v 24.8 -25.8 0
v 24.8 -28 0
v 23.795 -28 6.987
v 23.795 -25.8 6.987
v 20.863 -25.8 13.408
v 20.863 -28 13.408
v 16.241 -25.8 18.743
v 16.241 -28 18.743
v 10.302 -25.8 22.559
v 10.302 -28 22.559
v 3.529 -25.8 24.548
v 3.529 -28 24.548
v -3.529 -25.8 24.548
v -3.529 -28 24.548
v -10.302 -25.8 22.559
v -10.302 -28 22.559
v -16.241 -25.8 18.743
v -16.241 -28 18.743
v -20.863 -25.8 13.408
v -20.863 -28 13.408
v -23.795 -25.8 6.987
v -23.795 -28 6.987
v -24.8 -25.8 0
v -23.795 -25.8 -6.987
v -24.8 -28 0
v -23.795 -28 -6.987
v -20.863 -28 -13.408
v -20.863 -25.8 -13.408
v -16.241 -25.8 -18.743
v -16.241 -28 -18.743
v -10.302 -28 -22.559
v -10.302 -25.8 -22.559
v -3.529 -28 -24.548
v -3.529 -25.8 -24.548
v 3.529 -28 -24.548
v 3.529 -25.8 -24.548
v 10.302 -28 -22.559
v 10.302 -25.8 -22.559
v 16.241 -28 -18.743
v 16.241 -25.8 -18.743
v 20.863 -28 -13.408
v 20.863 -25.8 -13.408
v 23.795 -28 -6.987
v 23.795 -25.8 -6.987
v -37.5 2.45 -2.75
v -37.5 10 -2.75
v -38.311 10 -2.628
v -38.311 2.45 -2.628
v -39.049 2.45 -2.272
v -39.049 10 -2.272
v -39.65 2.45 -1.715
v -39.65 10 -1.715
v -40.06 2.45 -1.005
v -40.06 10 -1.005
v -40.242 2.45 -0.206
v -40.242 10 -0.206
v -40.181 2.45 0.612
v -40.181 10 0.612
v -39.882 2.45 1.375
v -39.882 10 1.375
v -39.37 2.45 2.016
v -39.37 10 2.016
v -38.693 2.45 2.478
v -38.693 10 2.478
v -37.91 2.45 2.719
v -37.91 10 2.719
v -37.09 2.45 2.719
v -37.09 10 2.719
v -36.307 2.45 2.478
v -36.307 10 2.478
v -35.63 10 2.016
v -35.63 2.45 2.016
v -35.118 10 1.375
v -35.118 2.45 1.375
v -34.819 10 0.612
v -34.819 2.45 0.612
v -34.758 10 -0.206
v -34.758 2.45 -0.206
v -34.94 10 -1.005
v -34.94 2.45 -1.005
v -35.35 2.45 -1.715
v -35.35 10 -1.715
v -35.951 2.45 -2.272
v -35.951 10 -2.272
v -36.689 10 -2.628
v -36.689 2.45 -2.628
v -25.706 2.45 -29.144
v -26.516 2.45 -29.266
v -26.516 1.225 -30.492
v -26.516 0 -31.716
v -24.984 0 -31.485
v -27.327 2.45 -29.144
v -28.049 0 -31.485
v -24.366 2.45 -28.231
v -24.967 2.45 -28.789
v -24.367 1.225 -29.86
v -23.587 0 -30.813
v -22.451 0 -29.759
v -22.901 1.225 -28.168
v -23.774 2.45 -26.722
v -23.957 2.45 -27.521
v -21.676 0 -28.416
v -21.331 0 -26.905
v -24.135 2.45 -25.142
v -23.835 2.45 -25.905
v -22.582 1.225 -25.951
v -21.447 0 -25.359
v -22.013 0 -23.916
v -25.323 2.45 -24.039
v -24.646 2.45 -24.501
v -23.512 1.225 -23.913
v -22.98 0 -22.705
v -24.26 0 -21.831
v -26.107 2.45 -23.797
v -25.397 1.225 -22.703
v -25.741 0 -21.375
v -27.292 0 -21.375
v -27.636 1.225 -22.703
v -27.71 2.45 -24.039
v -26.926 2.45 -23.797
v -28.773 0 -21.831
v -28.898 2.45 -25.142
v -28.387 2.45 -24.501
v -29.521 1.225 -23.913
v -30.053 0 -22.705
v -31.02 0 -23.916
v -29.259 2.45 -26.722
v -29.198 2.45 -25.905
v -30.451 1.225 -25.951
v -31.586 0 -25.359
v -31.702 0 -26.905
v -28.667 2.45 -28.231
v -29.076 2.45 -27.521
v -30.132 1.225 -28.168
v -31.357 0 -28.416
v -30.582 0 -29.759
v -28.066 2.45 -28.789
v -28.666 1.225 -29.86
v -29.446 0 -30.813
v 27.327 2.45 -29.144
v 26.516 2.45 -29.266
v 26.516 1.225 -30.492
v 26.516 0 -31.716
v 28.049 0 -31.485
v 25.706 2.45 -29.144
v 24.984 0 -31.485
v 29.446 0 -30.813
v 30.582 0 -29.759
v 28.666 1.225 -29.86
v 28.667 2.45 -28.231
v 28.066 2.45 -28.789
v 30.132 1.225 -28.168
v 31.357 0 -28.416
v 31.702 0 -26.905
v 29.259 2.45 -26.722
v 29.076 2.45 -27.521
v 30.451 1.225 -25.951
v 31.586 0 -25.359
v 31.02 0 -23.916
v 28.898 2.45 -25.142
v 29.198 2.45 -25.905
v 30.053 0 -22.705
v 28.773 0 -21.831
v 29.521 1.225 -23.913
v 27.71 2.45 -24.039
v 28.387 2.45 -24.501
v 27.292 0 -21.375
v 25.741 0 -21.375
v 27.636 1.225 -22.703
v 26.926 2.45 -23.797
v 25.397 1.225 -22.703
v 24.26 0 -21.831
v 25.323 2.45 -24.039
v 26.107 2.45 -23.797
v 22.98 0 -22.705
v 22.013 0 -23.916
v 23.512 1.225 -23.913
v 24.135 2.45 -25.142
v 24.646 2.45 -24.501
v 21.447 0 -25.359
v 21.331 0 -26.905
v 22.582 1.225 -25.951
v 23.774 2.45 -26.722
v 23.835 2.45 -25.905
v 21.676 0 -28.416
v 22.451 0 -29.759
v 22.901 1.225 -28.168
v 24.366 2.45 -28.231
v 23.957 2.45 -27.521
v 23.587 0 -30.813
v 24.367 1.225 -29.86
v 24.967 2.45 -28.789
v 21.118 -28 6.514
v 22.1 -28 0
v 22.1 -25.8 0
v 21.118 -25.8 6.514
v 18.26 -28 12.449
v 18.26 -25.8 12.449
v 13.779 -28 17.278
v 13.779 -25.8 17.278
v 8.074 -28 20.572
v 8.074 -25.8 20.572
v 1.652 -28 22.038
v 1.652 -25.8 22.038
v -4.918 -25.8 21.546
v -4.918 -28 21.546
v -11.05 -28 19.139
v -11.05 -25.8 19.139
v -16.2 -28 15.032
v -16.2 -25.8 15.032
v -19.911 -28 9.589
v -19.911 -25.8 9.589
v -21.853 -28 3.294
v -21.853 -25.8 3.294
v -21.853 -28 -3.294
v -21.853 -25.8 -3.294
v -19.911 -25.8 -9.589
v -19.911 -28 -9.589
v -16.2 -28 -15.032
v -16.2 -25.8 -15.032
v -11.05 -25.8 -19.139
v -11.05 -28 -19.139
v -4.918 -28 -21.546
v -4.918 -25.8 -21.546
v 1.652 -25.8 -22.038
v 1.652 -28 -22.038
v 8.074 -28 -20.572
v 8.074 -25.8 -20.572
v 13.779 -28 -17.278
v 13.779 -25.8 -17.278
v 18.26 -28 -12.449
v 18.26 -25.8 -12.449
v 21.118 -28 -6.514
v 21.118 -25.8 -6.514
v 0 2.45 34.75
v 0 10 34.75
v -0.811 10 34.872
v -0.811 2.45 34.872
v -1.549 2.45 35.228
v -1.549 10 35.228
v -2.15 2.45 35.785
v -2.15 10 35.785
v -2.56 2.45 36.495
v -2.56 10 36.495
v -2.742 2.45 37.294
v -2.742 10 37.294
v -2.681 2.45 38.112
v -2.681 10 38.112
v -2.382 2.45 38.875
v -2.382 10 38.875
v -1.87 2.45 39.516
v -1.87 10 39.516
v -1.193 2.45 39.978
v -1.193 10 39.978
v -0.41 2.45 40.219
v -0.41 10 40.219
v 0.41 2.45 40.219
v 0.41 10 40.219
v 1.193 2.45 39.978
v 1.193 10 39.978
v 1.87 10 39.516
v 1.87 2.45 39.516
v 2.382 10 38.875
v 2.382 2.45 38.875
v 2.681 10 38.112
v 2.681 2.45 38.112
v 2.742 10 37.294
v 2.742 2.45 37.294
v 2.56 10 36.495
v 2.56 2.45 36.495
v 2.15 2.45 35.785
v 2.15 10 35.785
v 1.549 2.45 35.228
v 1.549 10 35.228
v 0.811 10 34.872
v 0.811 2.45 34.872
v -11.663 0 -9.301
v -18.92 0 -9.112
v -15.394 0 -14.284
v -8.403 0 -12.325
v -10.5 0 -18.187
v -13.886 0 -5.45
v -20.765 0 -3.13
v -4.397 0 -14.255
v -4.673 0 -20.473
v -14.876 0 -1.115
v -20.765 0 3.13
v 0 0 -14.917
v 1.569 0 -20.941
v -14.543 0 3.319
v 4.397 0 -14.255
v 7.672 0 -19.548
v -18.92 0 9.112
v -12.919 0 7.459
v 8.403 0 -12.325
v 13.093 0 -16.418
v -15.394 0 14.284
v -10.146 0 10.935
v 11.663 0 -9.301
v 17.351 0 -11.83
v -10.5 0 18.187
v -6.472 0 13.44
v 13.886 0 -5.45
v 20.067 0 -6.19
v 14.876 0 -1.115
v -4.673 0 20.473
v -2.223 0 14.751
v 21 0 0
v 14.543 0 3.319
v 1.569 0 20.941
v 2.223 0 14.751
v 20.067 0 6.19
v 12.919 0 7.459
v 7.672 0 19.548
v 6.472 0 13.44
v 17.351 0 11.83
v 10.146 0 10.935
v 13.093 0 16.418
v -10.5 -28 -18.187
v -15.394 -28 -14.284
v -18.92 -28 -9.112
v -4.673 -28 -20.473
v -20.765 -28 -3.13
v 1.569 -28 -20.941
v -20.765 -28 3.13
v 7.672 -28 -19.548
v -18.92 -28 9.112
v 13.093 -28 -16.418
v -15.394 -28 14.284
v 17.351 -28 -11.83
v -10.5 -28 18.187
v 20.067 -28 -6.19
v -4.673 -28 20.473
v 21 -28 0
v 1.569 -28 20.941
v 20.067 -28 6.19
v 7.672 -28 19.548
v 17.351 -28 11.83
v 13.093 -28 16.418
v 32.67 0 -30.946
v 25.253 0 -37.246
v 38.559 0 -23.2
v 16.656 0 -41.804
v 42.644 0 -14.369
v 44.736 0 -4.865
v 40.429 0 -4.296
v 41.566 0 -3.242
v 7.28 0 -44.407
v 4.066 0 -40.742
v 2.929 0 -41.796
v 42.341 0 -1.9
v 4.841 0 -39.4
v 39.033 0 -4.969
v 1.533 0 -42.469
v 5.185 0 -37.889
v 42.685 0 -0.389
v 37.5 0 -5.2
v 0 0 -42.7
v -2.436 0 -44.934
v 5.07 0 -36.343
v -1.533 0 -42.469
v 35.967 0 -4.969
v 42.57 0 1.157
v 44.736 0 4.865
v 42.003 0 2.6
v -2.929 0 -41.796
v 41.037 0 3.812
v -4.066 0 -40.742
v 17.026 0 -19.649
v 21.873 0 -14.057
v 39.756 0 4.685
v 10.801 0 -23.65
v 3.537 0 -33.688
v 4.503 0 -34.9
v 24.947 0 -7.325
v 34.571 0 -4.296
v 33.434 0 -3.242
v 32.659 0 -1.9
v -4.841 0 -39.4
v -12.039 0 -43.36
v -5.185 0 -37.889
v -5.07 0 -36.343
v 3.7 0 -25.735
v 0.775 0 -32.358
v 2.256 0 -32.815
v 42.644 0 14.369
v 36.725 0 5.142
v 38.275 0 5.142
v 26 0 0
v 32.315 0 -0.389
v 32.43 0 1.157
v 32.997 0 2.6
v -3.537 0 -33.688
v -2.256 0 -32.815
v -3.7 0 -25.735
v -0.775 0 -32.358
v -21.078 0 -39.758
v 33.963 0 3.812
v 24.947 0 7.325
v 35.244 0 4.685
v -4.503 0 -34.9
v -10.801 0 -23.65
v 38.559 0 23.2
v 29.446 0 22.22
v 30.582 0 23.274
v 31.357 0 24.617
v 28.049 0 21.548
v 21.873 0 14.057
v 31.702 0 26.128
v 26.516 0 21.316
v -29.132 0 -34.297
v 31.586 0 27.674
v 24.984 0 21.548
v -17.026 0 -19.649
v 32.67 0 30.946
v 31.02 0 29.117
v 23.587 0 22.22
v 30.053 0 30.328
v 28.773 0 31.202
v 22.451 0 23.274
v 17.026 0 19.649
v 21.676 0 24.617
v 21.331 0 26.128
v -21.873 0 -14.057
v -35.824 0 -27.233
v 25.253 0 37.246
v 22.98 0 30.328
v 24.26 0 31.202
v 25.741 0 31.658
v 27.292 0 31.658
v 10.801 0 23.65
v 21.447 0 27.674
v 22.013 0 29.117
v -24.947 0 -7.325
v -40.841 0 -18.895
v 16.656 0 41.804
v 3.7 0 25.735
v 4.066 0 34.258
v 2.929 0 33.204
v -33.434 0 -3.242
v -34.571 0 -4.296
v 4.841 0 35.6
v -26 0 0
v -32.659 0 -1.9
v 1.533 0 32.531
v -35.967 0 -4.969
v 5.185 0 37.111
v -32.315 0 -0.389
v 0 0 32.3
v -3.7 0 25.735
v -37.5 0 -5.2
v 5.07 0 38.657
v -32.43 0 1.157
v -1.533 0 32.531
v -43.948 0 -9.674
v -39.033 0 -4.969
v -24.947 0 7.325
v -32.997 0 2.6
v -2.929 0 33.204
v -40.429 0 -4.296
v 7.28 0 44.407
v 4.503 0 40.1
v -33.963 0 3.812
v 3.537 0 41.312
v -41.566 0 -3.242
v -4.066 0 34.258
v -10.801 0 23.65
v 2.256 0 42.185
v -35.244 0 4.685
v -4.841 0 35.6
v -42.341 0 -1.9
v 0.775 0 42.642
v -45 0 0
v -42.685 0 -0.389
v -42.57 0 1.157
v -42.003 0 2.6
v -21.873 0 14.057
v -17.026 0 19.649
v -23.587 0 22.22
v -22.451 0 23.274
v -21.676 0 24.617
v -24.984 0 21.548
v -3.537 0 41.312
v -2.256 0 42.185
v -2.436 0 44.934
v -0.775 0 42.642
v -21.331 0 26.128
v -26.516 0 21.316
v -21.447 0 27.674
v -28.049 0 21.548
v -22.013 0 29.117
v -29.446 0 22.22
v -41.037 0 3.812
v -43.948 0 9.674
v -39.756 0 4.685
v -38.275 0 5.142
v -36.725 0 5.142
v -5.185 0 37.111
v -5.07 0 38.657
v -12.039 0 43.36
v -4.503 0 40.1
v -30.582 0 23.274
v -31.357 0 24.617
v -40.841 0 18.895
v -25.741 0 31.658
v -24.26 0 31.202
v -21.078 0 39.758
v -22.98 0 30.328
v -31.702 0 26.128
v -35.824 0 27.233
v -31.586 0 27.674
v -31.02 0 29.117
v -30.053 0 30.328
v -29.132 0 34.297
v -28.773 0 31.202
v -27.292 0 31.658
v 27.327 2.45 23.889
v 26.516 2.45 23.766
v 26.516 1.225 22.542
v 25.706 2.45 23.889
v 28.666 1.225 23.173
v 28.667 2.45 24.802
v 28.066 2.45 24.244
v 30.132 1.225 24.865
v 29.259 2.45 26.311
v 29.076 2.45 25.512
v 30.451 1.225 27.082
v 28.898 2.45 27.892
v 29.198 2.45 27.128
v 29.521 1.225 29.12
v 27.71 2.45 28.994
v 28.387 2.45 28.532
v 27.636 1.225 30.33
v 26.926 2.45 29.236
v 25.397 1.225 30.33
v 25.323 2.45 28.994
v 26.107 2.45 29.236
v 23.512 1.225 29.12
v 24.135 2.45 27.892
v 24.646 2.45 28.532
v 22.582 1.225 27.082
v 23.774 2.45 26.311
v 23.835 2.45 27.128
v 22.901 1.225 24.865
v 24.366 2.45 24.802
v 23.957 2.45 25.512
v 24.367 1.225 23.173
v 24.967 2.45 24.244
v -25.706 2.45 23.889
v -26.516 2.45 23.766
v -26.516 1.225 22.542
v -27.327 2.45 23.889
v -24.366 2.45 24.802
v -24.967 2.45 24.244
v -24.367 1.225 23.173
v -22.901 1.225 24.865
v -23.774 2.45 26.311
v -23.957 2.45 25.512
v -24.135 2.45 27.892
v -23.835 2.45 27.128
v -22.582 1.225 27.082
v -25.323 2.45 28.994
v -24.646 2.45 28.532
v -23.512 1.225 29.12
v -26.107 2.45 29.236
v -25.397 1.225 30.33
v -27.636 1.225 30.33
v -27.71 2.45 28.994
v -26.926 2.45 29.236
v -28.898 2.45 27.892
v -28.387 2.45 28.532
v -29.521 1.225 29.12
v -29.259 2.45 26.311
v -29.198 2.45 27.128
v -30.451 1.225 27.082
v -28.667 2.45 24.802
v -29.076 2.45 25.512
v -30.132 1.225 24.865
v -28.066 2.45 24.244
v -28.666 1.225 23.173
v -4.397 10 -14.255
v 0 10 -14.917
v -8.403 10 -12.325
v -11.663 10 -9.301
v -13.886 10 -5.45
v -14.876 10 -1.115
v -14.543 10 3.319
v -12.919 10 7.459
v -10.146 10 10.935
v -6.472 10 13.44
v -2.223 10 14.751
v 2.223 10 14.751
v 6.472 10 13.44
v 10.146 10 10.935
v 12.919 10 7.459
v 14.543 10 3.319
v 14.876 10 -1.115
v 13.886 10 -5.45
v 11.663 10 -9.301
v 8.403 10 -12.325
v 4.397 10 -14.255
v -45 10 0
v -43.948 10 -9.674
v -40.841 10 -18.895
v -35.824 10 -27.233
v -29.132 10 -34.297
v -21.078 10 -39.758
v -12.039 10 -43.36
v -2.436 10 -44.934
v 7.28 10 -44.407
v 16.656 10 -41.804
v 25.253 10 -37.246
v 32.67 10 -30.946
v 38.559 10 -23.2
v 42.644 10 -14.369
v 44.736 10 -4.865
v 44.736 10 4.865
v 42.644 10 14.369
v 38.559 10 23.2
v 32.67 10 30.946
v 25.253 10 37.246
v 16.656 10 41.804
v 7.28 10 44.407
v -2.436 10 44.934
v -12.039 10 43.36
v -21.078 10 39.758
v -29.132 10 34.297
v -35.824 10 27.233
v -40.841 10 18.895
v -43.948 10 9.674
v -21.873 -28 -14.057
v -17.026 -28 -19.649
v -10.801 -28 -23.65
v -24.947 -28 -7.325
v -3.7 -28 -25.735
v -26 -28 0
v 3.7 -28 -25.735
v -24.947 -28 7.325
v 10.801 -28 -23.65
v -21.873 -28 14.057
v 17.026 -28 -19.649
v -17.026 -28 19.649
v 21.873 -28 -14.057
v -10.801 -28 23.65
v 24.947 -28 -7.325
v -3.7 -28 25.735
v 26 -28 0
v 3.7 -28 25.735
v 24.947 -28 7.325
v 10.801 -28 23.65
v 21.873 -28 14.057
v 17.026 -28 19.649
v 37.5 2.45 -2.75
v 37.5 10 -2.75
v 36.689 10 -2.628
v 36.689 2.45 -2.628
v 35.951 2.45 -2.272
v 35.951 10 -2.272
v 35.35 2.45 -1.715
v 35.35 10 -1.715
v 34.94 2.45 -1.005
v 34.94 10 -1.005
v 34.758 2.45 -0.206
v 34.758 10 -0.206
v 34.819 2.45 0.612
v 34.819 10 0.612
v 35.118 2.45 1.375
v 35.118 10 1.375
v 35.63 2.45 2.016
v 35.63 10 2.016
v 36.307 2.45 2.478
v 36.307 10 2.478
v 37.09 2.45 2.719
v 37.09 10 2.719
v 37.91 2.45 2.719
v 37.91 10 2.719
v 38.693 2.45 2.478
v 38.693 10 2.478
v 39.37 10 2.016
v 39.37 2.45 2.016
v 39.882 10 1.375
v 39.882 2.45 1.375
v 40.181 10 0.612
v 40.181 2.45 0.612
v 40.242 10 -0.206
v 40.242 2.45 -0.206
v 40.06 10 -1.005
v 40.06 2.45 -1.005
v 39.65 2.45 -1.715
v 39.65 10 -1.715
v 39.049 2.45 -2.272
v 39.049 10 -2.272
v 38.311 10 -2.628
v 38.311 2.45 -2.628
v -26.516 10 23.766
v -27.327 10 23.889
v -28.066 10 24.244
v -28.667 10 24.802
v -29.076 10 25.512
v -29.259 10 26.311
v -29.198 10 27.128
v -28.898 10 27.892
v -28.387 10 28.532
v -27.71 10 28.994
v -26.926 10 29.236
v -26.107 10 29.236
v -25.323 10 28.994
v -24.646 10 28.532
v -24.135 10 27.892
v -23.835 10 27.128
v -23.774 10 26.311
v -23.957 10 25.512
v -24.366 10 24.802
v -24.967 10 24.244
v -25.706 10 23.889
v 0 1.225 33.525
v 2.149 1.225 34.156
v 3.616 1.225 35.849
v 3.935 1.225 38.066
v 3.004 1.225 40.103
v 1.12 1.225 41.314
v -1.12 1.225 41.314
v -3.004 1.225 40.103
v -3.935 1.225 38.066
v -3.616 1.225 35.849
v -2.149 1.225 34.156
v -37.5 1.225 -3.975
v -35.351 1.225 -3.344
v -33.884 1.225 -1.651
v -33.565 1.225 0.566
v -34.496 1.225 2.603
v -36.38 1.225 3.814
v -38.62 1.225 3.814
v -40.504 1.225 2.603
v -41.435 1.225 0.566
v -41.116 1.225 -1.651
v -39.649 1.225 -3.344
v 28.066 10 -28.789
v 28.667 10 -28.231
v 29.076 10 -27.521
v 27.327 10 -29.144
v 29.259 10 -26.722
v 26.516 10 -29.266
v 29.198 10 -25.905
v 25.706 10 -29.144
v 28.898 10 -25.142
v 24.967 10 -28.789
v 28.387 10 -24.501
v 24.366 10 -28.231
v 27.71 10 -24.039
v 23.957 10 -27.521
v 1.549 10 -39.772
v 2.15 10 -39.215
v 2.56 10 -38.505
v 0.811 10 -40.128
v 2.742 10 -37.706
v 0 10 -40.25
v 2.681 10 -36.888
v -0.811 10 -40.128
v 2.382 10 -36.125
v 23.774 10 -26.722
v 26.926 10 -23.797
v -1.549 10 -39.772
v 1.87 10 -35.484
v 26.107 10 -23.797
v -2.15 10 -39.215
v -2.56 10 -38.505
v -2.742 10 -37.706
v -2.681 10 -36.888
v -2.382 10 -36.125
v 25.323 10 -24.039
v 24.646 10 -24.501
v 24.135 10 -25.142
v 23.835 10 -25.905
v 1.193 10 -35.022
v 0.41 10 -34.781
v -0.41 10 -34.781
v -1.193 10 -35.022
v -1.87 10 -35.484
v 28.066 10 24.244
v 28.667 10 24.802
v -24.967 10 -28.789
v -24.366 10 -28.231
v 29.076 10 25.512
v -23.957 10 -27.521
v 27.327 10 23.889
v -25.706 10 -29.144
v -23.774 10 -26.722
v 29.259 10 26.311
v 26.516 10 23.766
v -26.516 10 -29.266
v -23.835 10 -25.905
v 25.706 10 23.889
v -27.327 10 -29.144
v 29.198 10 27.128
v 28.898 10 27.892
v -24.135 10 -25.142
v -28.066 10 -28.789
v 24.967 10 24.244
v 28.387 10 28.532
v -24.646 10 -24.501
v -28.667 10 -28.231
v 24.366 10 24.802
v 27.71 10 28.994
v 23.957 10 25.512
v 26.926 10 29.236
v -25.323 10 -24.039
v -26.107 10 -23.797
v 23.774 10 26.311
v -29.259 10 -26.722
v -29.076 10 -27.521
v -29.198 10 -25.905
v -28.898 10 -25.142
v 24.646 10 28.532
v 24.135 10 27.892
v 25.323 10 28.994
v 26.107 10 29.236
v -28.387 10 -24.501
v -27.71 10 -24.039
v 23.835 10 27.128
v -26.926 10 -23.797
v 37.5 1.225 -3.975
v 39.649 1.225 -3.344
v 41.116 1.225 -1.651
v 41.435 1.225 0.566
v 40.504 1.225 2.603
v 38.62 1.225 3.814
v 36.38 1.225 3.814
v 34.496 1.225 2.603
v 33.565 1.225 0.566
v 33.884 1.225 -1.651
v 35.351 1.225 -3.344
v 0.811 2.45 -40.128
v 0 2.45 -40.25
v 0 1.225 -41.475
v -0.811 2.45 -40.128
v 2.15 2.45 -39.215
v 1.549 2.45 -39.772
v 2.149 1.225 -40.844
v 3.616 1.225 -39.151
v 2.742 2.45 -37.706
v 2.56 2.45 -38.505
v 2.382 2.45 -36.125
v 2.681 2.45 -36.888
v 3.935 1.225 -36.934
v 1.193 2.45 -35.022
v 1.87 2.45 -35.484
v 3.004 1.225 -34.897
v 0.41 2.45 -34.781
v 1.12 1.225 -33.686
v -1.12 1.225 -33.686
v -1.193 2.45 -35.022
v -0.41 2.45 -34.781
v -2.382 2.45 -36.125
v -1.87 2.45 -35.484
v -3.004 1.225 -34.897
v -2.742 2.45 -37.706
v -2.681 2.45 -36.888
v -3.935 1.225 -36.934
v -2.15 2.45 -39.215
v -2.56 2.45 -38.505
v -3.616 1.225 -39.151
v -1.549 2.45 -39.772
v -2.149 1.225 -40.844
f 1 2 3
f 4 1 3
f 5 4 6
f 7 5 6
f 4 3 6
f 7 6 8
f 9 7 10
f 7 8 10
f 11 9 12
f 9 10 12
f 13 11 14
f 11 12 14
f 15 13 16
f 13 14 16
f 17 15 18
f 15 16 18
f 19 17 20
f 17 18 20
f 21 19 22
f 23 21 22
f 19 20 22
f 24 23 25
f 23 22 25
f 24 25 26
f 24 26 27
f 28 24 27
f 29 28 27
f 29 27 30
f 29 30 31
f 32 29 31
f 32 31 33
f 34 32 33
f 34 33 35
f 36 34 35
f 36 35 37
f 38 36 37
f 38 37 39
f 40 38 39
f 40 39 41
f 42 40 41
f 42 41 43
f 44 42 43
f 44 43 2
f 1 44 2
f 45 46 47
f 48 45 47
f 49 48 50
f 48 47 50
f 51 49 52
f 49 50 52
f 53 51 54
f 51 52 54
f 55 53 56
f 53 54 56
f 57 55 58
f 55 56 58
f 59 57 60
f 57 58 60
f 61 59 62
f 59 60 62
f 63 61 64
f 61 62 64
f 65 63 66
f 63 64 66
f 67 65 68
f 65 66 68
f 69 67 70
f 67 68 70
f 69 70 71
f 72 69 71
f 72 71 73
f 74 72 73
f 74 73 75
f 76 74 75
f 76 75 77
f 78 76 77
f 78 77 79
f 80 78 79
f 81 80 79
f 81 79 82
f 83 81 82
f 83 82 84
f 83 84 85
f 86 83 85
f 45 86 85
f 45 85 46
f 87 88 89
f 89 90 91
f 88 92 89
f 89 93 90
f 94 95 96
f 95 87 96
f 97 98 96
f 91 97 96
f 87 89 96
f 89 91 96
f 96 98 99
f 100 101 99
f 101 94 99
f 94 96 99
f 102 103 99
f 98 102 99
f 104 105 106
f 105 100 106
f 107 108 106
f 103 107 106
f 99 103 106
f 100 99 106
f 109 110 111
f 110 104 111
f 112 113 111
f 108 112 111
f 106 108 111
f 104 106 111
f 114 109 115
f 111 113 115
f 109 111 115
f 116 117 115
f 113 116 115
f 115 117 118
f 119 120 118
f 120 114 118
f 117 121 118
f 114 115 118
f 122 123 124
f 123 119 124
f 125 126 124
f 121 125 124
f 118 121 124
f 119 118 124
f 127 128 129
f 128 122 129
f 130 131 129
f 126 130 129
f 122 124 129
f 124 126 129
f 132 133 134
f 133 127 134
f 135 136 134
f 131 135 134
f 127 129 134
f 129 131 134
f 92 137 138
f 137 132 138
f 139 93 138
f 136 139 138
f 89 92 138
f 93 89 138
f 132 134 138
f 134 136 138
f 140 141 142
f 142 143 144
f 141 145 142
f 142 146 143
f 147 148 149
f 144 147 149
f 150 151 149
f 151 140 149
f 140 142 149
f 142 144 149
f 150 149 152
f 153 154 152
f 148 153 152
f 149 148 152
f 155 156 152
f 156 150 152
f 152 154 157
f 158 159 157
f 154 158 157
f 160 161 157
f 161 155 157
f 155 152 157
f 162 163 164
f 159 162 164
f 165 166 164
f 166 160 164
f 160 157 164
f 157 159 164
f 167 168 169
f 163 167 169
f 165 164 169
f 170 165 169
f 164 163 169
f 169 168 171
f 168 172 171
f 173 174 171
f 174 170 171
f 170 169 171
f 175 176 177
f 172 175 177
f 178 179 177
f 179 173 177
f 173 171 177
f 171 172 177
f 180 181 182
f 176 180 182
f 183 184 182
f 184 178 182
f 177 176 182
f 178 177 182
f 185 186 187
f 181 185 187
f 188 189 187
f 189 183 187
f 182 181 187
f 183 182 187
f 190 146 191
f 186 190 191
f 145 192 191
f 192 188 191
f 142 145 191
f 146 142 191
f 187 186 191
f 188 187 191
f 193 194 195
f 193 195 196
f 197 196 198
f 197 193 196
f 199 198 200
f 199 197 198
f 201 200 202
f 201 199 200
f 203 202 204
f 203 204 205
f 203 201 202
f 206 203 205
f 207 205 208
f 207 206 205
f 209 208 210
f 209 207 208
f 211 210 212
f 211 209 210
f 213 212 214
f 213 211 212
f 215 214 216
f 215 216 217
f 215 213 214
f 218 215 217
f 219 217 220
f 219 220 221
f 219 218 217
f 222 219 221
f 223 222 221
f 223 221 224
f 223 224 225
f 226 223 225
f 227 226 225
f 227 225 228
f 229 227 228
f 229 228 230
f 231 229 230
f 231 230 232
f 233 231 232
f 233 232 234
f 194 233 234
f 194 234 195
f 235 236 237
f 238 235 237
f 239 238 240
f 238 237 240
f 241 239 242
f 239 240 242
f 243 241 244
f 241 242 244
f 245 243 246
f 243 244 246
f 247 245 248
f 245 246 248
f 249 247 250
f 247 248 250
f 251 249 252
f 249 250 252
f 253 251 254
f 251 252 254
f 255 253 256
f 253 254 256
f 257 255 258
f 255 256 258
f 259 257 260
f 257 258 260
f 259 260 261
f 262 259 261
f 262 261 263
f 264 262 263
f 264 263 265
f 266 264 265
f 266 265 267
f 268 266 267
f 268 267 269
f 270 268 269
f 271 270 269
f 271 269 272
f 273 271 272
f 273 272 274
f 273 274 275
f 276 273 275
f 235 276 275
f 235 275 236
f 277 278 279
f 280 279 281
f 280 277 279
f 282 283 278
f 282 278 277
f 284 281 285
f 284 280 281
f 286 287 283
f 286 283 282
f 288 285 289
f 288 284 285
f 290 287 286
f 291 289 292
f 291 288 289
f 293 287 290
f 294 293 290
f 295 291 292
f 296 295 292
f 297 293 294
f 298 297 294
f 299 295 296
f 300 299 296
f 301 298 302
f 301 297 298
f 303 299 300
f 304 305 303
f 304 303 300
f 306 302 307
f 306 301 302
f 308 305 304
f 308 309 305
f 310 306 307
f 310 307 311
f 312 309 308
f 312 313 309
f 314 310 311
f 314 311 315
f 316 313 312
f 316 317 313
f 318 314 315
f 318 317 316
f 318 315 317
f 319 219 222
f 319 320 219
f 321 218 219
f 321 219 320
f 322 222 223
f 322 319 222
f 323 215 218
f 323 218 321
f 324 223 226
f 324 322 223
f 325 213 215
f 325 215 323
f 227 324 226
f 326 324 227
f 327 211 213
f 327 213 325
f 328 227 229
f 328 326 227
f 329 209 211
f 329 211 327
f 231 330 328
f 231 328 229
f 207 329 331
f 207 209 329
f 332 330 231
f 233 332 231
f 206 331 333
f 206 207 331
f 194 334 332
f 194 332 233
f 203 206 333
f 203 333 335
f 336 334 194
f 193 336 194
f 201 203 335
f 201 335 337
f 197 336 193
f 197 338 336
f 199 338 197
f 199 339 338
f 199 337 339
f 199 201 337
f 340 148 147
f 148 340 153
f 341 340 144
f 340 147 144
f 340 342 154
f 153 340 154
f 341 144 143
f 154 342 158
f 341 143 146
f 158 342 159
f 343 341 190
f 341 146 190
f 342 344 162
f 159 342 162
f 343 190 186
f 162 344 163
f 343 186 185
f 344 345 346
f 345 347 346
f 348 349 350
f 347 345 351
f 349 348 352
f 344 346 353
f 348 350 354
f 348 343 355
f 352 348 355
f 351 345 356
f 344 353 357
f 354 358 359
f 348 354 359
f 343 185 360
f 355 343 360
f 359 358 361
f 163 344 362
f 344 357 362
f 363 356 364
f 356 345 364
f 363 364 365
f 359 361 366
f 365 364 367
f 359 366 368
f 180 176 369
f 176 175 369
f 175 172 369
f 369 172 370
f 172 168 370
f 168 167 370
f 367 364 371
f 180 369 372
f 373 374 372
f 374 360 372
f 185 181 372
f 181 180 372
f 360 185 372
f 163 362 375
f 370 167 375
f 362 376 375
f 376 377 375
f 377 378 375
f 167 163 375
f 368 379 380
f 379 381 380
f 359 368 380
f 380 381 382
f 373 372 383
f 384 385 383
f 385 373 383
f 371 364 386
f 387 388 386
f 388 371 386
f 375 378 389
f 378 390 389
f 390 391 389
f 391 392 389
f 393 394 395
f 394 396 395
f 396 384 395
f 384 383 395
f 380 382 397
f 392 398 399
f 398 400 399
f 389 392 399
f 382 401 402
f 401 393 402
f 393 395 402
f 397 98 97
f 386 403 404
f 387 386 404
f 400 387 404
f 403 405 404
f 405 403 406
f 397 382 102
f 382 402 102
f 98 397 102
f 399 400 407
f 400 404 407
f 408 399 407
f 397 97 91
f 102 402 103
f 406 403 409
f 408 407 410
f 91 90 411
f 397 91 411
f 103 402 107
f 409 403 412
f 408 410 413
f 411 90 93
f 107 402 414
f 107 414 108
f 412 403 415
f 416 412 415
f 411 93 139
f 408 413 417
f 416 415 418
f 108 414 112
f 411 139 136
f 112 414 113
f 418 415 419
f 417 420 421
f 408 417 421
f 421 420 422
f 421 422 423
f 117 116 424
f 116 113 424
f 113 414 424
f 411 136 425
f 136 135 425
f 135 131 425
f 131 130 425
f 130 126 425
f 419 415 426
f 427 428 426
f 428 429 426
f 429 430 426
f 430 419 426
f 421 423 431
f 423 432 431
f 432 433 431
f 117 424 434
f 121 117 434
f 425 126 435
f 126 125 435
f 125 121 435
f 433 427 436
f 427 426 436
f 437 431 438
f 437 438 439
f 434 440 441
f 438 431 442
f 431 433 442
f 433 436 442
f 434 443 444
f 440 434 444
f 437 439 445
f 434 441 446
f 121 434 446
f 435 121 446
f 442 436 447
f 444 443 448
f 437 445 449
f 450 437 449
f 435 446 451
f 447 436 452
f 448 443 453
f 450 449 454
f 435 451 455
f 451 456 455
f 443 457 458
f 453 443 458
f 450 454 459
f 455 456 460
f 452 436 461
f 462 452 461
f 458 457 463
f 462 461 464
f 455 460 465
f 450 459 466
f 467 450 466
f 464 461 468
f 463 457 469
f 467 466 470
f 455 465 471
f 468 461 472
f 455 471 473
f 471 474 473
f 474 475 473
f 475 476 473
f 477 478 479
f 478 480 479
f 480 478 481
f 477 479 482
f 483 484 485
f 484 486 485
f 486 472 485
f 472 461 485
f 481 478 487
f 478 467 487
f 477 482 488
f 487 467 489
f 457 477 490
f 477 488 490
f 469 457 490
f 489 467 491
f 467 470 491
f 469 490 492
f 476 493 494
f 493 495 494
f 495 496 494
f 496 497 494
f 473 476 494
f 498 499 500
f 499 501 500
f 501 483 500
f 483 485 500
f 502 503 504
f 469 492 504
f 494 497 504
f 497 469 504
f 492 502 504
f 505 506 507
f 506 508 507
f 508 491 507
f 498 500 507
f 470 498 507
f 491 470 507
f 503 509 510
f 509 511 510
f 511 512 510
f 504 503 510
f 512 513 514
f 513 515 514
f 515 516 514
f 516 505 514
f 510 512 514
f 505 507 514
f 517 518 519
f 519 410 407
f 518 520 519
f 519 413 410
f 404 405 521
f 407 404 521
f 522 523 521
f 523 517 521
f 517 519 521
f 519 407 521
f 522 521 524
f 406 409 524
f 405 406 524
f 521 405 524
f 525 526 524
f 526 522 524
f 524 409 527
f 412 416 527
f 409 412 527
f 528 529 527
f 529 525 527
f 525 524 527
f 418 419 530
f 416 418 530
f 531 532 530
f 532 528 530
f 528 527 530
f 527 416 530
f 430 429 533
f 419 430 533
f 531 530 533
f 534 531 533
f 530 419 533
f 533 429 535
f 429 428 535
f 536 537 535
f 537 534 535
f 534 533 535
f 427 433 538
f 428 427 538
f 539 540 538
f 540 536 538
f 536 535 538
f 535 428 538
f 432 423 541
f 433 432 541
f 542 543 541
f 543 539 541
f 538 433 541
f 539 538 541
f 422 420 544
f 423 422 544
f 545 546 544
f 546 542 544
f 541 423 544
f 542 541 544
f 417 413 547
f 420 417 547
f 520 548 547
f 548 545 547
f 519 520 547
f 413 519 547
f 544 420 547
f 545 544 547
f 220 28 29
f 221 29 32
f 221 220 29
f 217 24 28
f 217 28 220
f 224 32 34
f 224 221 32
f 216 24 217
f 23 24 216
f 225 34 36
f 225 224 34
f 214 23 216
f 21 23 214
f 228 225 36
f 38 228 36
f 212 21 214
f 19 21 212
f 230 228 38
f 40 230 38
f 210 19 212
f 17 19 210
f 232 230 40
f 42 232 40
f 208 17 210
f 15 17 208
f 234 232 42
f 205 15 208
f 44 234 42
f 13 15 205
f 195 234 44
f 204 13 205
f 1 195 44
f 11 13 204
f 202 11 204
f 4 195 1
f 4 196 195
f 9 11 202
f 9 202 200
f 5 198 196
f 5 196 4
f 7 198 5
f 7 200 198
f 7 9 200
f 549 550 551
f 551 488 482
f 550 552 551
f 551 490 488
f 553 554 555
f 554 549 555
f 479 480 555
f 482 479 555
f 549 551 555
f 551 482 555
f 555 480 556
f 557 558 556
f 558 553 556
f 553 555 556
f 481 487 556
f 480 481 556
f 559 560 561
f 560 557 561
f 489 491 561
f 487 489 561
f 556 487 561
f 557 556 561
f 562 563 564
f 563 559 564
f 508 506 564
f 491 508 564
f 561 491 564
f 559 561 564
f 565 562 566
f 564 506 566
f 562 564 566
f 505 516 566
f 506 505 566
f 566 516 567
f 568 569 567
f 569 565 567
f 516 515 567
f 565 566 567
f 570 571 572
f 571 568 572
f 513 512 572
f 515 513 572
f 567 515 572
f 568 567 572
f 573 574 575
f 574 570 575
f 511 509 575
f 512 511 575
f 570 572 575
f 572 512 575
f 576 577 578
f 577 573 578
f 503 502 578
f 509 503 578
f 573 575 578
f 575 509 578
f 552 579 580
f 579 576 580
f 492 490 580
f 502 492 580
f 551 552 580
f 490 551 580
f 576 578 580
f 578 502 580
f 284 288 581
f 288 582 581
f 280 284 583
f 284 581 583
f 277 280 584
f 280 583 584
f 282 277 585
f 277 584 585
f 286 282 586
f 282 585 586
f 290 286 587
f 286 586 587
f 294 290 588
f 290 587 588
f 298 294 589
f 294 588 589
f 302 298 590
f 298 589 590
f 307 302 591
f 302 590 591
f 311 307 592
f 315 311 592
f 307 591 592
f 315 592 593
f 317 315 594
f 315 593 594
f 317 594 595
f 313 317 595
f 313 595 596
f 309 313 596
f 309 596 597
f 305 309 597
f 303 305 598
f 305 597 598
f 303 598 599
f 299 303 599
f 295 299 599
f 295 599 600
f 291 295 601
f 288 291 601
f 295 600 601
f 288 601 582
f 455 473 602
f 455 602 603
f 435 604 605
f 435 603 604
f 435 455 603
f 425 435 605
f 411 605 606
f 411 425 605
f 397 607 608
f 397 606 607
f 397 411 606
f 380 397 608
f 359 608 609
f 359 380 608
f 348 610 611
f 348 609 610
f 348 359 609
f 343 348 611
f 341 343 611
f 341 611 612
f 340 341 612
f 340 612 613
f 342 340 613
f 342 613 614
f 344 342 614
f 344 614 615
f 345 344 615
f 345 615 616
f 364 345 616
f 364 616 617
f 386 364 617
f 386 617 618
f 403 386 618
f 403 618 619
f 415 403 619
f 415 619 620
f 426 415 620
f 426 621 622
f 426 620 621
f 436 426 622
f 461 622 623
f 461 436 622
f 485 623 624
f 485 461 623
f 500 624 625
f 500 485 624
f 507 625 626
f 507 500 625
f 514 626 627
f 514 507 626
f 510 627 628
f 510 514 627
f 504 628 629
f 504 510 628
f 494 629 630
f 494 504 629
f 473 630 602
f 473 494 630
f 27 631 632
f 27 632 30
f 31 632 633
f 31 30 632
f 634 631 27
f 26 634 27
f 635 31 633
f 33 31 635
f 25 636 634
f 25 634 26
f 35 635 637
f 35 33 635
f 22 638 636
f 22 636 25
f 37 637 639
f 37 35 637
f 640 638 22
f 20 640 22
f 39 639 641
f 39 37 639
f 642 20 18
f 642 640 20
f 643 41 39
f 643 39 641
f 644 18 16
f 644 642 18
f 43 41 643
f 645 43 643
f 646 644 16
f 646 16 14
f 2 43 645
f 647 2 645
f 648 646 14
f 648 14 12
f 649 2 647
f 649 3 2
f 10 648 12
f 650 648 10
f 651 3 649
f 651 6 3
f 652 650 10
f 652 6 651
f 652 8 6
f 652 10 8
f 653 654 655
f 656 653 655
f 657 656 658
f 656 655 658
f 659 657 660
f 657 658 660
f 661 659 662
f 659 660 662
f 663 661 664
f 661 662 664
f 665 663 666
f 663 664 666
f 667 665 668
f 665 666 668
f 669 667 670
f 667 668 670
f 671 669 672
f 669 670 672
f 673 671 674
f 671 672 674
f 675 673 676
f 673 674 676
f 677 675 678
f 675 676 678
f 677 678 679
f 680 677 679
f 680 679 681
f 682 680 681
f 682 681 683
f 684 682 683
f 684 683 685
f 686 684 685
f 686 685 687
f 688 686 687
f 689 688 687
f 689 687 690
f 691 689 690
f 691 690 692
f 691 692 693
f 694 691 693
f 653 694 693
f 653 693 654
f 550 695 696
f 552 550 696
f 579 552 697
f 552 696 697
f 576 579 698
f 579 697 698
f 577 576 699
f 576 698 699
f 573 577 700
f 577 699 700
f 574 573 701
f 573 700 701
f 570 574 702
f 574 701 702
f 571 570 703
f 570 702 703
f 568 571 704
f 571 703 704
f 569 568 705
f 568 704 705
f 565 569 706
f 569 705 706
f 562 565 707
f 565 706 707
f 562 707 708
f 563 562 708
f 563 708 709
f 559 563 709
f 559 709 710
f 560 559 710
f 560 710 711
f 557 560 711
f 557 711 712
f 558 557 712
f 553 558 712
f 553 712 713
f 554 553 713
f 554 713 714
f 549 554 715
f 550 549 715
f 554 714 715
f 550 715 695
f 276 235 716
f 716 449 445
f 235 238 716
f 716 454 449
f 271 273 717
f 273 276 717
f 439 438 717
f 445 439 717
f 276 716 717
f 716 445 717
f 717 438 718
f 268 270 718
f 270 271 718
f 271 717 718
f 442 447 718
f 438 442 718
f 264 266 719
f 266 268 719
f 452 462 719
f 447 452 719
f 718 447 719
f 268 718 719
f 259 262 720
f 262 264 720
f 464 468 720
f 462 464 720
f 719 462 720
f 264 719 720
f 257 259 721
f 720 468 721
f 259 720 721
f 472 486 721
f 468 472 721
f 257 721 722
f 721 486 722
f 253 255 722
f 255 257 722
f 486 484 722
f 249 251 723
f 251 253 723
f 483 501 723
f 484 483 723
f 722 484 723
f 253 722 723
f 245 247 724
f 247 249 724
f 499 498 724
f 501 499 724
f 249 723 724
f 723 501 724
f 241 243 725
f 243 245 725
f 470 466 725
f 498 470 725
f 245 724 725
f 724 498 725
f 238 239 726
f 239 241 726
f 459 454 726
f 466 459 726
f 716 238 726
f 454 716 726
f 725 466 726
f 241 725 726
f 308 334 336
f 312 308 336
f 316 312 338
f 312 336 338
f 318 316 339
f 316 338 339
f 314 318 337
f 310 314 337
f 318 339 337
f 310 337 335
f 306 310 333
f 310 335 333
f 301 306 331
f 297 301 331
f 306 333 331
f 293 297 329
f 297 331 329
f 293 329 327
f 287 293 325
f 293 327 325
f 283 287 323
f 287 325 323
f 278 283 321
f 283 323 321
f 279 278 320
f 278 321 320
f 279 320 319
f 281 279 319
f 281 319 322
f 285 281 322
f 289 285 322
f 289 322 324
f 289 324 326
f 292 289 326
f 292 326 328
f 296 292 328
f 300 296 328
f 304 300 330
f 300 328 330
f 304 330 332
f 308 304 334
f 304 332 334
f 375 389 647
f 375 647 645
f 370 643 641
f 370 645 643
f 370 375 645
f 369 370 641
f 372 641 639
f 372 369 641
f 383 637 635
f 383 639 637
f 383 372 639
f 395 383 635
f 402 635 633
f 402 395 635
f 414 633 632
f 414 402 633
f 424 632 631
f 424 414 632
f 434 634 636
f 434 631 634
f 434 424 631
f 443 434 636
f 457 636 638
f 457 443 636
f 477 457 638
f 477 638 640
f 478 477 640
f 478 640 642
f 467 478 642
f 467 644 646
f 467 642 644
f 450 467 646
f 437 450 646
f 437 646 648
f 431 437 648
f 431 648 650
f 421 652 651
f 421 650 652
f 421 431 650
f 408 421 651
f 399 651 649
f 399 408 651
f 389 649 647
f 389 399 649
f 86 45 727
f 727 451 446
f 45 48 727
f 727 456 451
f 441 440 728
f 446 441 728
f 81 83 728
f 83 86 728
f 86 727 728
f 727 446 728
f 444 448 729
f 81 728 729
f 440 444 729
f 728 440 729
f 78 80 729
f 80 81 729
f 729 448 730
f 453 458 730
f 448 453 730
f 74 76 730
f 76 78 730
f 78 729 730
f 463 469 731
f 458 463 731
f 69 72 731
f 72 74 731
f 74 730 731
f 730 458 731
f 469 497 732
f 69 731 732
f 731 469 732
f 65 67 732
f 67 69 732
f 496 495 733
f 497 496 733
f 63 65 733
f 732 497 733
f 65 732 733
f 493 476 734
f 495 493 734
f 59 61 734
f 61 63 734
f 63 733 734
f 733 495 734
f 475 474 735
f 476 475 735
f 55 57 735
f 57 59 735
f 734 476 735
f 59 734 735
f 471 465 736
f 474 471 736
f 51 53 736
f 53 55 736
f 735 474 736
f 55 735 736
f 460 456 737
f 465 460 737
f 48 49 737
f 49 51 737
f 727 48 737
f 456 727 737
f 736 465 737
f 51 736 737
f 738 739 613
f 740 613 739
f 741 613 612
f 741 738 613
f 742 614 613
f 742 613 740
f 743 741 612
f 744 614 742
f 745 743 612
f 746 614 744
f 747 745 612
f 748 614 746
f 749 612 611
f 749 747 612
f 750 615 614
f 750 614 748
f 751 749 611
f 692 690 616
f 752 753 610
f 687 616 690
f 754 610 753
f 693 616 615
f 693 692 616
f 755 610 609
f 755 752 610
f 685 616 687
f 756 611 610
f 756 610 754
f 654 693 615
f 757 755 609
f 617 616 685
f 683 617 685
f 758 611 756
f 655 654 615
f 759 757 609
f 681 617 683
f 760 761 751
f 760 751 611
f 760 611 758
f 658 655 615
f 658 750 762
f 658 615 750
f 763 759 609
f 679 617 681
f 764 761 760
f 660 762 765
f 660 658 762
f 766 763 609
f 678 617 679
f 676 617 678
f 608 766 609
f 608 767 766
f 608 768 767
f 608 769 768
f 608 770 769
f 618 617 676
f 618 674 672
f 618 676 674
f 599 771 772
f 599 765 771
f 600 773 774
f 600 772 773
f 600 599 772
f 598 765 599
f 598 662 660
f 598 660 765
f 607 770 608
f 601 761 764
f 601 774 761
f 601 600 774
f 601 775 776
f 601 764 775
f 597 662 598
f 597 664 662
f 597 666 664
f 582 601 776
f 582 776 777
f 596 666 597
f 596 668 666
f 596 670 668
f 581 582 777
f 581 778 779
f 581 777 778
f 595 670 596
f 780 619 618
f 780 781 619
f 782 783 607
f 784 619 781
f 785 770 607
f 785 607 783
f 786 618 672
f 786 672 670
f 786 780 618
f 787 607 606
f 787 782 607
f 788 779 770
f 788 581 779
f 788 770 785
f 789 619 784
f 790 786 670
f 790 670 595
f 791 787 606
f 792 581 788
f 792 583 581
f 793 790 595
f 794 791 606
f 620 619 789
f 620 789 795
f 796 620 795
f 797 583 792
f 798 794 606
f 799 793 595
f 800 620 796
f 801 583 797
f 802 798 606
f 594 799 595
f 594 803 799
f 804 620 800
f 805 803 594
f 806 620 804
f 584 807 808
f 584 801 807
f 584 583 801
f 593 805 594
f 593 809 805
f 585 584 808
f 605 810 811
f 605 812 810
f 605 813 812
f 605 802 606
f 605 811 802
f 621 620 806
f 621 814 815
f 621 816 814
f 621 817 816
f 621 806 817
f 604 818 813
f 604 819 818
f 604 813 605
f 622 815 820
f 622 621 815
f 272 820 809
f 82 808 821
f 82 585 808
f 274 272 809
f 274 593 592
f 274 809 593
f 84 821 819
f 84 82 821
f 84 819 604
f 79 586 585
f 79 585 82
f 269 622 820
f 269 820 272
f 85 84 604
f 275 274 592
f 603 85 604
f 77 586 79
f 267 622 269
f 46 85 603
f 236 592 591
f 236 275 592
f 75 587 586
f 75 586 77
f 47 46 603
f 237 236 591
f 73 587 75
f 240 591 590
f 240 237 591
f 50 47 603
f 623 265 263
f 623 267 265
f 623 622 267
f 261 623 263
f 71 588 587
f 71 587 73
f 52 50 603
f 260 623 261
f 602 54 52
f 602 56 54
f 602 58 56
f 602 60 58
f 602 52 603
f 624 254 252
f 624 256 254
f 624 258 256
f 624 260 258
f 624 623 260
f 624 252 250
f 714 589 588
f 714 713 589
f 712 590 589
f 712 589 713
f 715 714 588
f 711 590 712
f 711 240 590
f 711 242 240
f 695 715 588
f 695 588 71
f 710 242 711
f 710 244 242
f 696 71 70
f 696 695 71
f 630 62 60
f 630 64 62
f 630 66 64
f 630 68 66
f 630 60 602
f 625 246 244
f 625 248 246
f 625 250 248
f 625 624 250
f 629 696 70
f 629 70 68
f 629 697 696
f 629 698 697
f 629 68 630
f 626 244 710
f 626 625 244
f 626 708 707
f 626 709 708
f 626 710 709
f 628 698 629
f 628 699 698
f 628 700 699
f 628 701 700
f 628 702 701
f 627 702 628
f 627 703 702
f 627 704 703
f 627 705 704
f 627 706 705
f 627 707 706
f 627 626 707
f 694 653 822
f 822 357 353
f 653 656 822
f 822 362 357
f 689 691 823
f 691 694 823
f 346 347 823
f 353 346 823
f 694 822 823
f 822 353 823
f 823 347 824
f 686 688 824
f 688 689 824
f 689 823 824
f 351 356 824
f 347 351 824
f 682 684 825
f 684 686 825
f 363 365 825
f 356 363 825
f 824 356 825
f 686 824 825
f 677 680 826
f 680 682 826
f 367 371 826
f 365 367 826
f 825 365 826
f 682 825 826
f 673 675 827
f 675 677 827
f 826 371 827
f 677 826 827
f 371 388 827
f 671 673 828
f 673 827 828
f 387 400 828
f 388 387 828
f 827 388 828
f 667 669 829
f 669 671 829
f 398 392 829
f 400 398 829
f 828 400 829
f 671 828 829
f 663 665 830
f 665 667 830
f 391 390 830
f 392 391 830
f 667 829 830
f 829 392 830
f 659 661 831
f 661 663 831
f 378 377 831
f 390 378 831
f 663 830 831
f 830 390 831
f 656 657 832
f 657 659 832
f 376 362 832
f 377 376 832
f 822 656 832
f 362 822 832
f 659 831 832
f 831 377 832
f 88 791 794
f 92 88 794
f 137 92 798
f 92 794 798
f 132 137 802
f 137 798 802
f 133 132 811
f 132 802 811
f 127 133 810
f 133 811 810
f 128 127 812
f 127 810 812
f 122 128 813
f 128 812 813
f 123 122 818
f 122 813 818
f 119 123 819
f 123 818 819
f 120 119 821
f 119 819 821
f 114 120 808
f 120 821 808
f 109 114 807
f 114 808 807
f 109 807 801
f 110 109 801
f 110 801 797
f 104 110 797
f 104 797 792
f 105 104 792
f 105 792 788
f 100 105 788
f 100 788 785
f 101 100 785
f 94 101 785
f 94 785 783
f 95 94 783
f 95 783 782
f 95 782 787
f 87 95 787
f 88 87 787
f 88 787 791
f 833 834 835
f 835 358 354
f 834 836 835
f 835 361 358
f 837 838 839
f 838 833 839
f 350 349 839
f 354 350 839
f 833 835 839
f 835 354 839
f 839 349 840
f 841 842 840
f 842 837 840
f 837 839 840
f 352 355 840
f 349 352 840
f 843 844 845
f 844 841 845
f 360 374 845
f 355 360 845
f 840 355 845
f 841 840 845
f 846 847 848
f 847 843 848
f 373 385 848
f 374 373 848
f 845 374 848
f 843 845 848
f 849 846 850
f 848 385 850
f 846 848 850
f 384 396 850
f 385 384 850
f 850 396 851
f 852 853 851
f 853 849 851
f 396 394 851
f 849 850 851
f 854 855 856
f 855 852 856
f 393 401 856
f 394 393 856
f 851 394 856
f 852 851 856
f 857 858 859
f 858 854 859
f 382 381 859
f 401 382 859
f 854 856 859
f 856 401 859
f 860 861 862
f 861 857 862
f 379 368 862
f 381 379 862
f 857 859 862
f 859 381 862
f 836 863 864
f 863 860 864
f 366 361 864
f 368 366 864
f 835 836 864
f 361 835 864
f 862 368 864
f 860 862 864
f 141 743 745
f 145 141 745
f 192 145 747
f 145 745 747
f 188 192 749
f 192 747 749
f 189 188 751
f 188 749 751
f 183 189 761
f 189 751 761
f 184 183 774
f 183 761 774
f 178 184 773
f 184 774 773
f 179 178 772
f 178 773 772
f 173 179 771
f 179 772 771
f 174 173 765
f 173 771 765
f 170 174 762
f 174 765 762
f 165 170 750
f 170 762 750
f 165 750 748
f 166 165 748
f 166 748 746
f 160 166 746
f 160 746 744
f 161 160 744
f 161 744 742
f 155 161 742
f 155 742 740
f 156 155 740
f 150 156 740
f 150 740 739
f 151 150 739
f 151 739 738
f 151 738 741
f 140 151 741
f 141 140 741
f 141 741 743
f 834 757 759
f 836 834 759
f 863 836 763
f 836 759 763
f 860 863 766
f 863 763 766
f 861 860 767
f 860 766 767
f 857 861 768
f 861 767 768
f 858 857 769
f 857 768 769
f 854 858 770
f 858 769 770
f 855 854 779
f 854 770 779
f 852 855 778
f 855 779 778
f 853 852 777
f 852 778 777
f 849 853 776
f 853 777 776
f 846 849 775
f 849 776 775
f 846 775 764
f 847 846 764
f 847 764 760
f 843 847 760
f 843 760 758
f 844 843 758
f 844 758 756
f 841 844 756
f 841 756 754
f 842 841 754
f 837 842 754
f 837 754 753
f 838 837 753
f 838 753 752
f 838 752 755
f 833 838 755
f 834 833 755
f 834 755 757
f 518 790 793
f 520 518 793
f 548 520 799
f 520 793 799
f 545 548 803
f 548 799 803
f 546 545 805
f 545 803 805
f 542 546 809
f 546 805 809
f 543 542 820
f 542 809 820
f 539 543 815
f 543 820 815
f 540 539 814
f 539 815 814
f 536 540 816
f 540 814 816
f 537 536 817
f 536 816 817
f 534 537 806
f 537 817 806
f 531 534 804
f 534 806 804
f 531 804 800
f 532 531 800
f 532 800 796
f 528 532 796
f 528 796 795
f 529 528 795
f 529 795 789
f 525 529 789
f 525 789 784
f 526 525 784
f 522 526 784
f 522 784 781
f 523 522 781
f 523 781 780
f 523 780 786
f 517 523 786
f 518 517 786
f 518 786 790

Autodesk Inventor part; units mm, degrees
ref_plane "YZ Plane" through (0, 0, 0) normal (1, 0, 0) x (0, 1, 0)
ref_plane "XZ Plane" through (0, 0, 0) normal (0, 1, 0) x (-1, 0, 0)
ref_plane "XY Plane" through (0, 0, 0) normal (0, 0, 1) x (1, 0, 0)
sketch "Sketch1" plane through (0, 0, 0) normal (0, 1, 0) x (-1, 0, 0)
  circle A0 centre (0, 0) radius 45
  dimension "d0" = 90
extrude "Extrusion1" add sketch "Sketch1" along normal blind 10
sketch "Sketch2" plane through (0, 0, 0) normal (0, -1, 0) x (1, 0, 0)
  circle A0 centre (0, 0) radius 26
  dimension "d3" = 52
extrude "Extrusion2" add sketch "Sketch2" along normal blind 28
sketch "Sketch3" plane through (0, -28, 0) normal (0, -1, 0) x (1, 0, 0)
  circle A0 centre (0, 0) radius 21
  dimension "d6" = 42
extrude "Extrusion3" cut sketch "Sketch3" against normal blind 28
sketch "Sketch4" plane through (0, -28, 0) normal (0, -1, 0) x (1, 0, 0)
  circle A0 centre (0, 0) radius 22.1
  circle A1 centre (0, 0) radius 24.8
  dimension "d9" = 44.2
  dimension "d10" = 49.6
extrude "Extrusion4" cut sketch "Sketch4" against normal blind 2.2
sketch "Sketch5" plane through (0, 0, 0) normal (0, -1, 0) x (1, 0, 0)
  point P0 (0, 0)
  point P1 (0, 0)
hole "Hole1" at (0, 0, 0) direction (0, 1, 0) diameter 29.8349 end through all thread size "M32x2" class "6H" standard "ANSI Metric M Profile"
sketch "Sketch6" plane through (0, 0, 0) normal (0, -1, 0) x (1, 0, 0)
  point P0 (0, 0)
  point P1 (0, 37.5)
  point P2 (-26.5165, 26.5165)
  point P3 (-37.5, 0)
  point P4 (-26.5165, -26.5165)
  point P5 (0, -37.5)
  point P6 (26.5165, -26.5165)
  point P7 (37.5, 0)
  point P8 (26.5165, 26.5165)
  dimension "d20" = 37.5
  dimension "d30" = 360
hole "Hole2" at (0, 0, 37.5) at (-26.5165, 0, 26.5165) at (-37.5, 0, 0) at (-26.5165, 0, -26.5165) at (0, 0, -37.5) at (26.5165, 0, -26.5165) at (37.5, 0, 0) at (26.5165, 0, 26.5165) direction (0, 1, 0) diameter 5.5 end through all countersink diameter 10.4 countersink angle 90 clearance for "Flat Head Machine Screw" size "M5" standard "Ansi Metric M Profile"
properties part number "Passthrough Base"
